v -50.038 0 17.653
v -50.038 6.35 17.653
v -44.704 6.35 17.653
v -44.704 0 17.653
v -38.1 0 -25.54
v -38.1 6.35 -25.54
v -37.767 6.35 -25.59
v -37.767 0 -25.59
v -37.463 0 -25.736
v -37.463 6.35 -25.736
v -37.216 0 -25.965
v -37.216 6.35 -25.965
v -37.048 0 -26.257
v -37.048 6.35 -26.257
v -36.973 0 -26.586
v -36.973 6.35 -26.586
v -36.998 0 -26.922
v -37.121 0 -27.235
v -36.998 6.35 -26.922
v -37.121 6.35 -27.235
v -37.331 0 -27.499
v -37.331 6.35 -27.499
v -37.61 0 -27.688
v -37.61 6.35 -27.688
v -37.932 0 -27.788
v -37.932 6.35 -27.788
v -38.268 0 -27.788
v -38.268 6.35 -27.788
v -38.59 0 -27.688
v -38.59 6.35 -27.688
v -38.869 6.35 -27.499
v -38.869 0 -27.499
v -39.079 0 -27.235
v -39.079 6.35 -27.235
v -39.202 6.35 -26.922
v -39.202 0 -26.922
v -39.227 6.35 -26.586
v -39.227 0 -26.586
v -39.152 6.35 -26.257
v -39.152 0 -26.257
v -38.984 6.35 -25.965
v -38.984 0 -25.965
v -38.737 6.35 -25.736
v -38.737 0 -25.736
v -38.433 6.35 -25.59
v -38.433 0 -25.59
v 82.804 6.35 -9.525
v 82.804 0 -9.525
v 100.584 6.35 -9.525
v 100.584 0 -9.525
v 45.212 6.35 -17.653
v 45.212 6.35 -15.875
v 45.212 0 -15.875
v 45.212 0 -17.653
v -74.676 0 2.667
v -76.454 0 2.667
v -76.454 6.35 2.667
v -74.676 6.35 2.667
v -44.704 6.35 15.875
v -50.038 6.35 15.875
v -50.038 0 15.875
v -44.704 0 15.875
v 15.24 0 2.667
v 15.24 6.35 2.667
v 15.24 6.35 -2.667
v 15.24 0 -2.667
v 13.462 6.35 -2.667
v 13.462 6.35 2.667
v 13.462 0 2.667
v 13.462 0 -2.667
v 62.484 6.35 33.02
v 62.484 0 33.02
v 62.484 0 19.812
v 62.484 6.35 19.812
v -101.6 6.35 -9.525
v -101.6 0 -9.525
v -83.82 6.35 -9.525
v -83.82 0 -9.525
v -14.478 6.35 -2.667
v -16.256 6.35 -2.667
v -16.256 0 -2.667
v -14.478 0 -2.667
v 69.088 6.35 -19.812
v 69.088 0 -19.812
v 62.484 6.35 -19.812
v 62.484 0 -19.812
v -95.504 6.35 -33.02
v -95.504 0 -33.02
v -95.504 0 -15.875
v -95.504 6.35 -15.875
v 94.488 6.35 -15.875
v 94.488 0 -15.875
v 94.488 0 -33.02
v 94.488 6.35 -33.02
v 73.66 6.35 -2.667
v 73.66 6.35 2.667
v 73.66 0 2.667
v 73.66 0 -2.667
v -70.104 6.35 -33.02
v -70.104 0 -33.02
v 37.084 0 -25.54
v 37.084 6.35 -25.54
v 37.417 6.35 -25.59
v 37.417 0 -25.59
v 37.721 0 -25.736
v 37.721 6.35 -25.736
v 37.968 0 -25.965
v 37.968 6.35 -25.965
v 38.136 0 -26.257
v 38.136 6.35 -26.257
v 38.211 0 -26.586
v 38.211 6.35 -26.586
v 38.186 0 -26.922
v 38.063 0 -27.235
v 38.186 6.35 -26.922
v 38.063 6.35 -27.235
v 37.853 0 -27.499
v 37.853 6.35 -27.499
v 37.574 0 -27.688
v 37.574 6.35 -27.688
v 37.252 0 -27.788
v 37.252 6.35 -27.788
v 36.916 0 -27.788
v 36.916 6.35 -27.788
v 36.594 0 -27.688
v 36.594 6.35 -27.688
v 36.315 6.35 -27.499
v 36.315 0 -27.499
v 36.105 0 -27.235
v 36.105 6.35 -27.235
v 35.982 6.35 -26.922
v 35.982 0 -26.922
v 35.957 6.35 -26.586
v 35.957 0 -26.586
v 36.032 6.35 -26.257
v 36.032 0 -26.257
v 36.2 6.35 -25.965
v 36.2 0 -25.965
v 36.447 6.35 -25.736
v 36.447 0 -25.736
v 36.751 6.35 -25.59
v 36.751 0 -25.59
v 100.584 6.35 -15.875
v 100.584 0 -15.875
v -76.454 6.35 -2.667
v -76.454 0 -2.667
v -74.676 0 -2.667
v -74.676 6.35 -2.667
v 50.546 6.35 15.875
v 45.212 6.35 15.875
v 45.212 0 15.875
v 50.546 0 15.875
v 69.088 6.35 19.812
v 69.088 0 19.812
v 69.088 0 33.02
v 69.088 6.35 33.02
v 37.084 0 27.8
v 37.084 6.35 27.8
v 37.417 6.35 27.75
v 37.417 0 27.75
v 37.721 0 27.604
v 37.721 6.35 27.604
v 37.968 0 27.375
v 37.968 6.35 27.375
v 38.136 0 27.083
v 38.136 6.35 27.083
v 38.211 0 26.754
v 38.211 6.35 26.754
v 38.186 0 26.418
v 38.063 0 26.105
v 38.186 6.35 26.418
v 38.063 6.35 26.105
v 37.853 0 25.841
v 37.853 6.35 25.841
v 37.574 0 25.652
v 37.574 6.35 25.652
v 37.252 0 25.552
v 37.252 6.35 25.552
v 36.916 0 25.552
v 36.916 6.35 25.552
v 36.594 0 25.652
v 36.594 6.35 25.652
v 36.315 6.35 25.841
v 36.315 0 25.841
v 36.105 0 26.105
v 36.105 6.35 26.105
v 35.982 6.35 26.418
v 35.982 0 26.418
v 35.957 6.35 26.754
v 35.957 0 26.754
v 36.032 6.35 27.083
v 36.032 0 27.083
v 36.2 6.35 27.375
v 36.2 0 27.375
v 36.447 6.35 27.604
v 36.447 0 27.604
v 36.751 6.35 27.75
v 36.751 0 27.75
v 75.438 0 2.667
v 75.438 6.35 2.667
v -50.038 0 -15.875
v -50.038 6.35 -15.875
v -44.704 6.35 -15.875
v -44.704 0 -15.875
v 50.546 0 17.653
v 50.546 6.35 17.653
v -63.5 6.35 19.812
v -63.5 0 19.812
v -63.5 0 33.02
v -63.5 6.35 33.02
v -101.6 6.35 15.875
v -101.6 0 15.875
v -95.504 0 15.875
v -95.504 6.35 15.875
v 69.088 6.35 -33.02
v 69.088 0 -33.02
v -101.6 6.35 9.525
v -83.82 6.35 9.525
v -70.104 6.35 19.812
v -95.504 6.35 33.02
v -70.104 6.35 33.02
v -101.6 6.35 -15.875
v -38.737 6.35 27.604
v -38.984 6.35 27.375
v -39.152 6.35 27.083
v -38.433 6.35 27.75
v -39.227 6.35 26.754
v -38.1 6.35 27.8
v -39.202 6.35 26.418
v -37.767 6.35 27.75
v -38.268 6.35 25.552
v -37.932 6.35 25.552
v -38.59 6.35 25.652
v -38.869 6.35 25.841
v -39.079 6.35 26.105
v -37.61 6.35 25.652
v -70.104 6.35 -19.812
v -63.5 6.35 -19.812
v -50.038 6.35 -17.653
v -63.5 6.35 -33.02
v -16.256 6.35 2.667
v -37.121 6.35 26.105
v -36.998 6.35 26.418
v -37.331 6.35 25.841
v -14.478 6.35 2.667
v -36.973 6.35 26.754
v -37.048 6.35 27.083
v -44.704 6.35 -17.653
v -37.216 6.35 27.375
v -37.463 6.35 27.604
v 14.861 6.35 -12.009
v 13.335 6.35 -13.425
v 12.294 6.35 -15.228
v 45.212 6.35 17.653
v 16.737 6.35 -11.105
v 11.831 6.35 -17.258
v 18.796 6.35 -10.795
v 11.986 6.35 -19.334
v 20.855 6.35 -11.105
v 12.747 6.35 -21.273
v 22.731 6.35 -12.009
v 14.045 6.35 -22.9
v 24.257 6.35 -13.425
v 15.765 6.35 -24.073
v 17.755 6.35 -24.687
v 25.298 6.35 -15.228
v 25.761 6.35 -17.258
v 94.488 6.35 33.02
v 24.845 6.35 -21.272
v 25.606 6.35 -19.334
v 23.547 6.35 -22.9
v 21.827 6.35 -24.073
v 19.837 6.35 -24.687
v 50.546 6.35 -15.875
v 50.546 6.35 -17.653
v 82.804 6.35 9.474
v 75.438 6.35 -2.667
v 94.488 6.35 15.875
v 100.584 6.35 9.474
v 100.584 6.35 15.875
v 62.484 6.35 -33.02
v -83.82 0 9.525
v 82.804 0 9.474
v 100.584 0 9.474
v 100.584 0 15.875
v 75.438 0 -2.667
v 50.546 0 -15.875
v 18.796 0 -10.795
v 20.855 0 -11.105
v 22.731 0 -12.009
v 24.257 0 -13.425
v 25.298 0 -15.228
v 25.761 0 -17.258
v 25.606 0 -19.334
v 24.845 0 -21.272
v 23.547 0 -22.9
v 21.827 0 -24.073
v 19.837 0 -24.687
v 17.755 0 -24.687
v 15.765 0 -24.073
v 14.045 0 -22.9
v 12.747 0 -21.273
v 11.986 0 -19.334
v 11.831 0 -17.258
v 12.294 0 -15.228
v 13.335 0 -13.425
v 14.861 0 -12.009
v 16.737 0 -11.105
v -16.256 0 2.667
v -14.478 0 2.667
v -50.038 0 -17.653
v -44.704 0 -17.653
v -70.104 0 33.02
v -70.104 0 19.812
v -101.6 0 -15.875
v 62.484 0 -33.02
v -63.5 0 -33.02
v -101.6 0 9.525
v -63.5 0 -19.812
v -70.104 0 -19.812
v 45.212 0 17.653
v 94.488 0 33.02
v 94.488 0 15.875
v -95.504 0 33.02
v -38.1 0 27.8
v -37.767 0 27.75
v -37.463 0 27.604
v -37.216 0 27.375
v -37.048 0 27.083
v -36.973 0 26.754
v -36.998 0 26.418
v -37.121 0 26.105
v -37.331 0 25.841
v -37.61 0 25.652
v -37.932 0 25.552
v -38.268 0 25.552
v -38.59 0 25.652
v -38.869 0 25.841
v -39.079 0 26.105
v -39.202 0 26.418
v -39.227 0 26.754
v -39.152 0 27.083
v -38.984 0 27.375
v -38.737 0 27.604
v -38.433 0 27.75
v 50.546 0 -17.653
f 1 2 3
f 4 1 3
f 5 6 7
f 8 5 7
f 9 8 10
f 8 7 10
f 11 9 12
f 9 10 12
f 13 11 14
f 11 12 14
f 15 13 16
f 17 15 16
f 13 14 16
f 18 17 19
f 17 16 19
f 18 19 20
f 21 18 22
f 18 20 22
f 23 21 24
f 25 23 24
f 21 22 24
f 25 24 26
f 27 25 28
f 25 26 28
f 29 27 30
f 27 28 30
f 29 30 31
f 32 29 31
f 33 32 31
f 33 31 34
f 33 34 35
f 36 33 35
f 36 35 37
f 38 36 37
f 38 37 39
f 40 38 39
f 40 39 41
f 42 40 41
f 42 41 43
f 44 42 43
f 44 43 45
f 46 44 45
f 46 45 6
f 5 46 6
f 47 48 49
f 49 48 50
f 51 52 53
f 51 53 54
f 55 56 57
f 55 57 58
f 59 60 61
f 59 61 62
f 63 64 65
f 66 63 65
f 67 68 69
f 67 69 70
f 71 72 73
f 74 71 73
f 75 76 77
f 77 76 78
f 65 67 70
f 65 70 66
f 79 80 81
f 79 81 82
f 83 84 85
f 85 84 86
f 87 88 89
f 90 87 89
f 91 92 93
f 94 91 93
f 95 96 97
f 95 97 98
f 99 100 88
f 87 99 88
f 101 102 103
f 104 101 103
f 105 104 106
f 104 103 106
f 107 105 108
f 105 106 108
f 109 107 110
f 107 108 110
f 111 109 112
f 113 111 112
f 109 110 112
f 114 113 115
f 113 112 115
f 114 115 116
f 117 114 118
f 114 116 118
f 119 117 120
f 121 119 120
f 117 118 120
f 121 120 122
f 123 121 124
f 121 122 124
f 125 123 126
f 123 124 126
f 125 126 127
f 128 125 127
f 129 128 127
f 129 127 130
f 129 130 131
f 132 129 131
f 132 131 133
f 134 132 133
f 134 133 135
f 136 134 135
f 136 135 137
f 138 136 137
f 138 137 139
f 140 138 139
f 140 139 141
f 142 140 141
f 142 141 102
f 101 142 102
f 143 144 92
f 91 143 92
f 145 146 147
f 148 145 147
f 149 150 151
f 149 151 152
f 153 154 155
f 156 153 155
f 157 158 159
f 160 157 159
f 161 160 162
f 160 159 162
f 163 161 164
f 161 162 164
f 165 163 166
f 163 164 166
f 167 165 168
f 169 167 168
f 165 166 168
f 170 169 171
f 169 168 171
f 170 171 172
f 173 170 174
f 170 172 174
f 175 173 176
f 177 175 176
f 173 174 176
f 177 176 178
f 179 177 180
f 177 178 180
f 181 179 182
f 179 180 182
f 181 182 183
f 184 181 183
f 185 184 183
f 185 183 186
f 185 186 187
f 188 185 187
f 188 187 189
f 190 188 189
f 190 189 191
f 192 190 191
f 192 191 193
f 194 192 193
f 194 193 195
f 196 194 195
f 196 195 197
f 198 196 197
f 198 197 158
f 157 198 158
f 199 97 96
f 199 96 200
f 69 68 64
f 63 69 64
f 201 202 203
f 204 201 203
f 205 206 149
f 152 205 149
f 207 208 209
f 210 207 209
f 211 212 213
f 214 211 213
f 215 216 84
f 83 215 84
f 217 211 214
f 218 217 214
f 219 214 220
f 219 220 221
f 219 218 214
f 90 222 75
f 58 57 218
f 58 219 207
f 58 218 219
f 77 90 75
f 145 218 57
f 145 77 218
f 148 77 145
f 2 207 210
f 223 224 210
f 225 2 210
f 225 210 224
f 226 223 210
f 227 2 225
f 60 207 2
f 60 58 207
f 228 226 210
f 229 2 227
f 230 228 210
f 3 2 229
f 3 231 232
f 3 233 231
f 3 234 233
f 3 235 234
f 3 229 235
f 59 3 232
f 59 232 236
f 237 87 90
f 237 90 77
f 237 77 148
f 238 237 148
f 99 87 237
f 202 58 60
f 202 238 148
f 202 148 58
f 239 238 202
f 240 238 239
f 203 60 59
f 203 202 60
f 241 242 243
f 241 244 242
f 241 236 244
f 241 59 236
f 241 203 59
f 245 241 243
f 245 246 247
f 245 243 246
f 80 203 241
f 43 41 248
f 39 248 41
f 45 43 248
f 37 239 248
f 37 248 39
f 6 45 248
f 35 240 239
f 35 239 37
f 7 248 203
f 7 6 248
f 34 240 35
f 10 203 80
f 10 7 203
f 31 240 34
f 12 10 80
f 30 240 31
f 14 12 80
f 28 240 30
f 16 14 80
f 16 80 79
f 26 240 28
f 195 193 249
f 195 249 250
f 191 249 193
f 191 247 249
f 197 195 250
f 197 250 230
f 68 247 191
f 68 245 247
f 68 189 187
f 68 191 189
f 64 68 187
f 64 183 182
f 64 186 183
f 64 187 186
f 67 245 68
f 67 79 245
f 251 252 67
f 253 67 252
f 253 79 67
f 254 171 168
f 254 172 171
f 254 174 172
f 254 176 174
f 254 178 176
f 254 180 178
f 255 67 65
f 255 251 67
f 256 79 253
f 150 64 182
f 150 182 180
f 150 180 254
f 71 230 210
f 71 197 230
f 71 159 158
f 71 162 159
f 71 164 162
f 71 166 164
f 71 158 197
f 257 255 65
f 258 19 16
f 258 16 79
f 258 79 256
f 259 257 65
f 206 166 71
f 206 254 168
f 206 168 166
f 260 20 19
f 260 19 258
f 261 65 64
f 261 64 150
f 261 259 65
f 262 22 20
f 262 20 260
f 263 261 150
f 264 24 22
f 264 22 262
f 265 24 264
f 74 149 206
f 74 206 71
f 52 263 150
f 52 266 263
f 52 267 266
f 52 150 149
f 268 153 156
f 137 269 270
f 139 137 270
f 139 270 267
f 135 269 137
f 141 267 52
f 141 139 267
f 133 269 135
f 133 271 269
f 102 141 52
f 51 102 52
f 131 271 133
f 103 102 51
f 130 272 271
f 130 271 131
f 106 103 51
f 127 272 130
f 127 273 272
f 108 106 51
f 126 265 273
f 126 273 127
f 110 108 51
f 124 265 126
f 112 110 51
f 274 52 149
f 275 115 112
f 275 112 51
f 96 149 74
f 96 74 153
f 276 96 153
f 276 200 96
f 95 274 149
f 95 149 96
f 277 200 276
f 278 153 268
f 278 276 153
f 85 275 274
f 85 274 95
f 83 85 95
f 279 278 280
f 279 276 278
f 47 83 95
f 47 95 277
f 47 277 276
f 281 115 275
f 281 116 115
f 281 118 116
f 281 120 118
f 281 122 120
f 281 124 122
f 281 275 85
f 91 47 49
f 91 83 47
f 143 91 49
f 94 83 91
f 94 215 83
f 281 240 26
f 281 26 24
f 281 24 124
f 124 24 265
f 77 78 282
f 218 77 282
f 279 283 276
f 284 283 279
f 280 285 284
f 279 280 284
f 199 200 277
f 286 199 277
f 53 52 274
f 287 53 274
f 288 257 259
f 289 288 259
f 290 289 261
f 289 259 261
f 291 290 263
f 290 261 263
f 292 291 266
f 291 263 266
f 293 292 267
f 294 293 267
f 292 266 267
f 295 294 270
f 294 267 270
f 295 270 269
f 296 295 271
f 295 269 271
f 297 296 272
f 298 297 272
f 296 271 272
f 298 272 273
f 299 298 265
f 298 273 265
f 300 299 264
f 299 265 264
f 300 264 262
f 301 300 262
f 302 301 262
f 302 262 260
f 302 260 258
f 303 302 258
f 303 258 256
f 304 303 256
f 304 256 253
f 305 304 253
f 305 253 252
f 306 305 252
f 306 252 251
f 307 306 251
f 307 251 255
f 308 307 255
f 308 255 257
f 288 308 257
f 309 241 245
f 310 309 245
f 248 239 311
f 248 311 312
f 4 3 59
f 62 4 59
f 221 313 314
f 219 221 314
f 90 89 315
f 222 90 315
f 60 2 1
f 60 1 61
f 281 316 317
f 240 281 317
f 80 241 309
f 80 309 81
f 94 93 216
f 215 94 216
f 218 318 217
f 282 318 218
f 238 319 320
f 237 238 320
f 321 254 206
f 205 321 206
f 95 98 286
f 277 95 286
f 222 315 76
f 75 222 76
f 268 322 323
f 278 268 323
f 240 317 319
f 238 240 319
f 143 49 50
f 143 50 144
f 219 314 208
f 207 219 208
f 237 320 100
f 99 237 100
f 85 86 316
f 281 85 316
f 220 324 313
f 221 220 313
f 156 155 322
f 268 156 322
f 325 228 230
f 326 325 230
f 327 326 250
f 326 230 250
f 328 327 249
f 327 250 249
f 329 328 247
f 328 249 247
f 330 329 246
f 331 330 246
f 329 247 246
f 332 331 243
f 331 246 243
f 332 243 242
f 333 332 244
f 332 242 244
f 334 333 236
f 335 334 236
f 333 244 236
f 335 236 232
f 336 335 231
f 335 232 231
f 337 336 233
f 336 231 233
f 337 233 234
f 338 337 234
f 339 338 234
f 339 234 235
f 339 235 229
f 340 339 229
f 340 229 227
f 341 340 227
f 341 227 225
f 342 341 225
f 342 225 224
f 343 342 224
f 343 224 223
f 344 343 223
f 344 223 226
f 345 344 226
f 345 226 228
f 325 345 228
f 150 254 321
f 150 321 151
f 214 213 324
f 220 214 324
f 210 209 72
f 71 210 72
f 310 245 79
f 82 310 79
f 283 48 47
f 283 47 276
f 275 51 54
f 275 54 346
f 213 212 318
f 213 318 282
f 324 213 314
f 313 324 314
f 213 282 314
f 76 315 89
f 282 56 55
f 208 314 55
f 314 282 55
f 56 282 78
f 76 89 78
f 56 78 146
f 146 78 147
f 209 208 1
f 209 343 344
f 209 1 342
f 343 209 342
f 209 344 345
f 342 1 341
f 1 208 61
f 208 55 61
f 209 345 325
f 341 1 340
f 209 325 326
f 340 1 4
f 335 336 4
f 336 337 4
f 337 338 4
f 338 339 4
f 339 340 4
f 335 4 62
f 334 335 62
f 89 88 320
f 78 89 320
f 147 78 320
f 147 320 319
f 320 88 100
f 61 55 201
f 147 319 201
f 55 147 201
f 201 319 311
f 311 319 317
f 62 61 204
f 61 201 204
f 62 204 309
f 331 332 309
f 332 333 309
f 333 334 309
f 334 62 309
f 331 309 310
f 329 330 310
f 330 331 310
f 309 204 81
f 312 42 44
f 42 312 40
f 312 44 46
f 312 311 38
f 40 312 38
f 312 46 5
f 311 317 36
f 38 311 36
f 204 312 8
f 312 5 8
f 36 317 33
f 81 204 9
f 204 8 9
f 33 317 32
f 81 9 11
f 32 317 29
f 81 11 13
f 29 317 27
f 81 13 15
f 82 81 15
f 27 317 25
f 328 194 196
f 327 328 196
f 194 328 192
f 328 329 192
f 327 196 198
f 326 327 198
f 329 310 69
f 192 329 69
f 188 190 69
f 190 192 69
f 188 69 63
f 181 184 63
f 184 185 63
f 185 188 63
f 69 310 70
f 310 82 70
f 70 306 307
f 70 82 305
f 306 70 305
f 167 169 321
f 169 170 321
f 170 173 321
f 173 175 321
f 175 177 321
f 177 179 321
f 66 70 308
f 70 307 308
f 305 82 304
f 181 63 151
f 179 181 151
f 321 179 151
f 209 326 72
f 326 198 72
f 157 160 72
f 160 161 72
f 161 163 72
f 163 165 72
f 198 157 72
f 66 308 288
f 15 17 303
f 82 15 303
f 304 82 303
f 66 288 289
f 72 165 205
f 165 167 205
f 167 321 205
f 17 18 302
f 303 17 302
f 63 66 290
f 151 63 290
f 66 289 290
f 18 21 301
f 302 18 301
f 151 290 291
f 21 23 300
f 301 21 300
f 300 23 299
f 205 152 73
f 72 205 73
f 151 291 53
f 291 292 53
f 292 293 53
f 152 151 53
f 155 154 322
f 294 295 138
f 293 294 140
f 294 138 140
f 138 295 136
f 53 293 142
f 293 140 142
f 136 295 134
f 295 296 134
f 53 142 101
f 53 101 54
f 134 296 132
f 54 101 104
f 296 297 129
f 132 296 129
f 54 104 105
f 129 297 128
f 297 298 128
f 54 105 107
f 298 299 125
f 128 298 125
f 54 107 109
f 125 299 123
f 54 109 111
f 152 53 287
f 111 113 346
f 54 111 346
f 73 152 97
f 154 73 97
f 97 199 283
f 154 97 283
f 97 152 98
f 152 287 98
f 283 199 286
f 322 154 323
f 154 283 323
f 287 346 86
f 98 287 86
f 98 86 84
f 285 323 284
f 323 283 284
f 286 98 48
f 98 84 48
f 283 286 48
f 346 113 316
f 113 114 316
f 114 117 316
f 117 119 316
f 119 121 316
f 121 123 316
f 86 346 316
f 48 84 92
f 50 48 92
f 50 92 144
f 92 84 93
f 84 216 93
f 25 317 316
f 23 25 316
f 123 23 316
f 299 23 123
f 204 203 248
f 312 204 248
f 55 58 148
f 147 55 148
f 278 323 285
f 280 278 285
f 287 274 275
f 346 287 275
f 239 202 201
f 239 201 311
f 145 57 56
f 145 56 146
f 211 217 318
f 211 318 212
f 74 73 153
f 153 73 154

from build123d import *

# Parameters (mm, degrees)
BOSS_EXTRUDE1_DEPTH = 6.35
SKETCH2_R           = 6.985
SKETCH2_W           = 5.334
SKETCH2_H           = 1.778
CUT_EXTRUDE1_DEPTH  = 10.16
SKETCH3_W           = 1.778
SKETCH3_H           = 5.334
CUT_EXTRUDE2_DEPTH  = 10.16
SKETCH4_R           = 1.1303
CUT_EXTRUDE3_DEPTH  = 10.16
SKETCH5_W           = 17.78
SKETCH5_H           = 19.05
SKETCH5_H_2         = 18.9992
CUT_EXTRUDE4_DEPTH  = 10.16


with BuildPart() as part:
    # Sketch1 → Boss-Extrude1 (new body)
    with BuildSketch(Plane(origin=(0, 0, 0), x_dir=(1, 0, 0), z_dir=(0, 1, 0))):
        Polygon((-95.504, 15.875), (-101.6, 15.875), (-101.6, -15.875), (-95.504, -15.875), (-95.504, -33.02), (-70.104, -33.02), (-70.104, -19.812), (-63.5, -19.812), (-63.5, -33.02), (2.794, -33.02), (9.398, -33.02), (62.484, -33.02), (62.484, -19.812), (69.088, -19.812), (69.088, -33.02), (94.488, -33.02), (94.488, -15.875), (100.584, -15.875), (100.584, 15.875), (94.488, 15.875), (94.488, 33.02), (69.088, 33.02), (69.088, 19.812), (62.484, 19.812), (62.484, 33.02), (9.398, 33.02), (2.794, 33.02), (-63.5, 33.02), (-63.5, 19.812), (-70.104, 19.812), (-70.104, 33.02), (-95.504, 33.02), align=None)
    extrude(amount=BOSS_EXTRUDE1_DEPTH)

    # Sketch2 → Cut-Extrude1 (cut)
    with BuildSketch(Plane(origin=(0, 6.35, 0), x_dir=(1, 0, 0), z_dir=(0, 1, 0))):
        with Locations(Location((18.796, 17.78, 0), (0, 0, 270))):
            Circle(SKETCH2_R)
        with Locations((-47.371, 16.764)):
            Rectangle(SKETCH2_W, SKETCH2_H)
        with Locations((-47.371, -16.764)):
            Rectangle(SKETCH2_W, SKETCH2_H)
        with Locations((47.879, 16.764)):
            Rectangle(SKETCH2_W, SKETCH2_H)
        with Locations((47.879, -16.764)):
            Rectangle(SKETCH2_W, SKETCH2_H)
    extrude(amount=-CUT_EXTRUDE1_DEPTH, mode=Mode.SUBTRACT)

    # Sketch3 → Cut-Extrude2 (cut)
    with BuildSketch(Plane(origin=(0, 6.35, 0), x_dir=(1, 0, 0), z_dir=(0, 1, 0))):
        with Locations((-75.565, 0)):
            Rectangle(SKETCH3_W, SKETCH3_H)
        with Locations((-15.367, 0)):
            Rectangle(SKETCH3_W, SKETCH3_H)
        with Locations((14.351, 0)):
            Rectangle(SKETCH3_W, SKETCH3_H)
        with Locations((74.549, 0)):
            Rectangle(SKETCH3_W, SKETCH3_H)
    extrude(amount=-CUT_EXTRUDE2_DEPTH, mode=Mode.SUBTRACT)

    # Sketch4 → Cut-Extrude3 (cut)
    with BuildSketch(Plane(origin=(0, 6.35, 0), x_dir=(1, 0, 0), z_dir=(0, 1, 0))):
        with Locations(Location((-38.1, 26.67, 0), (0, 0, 270))):
            Circle(SKETCH4_R)
        with Locations(Location((37.084, 26.67, 0), (0, 0, 270))):
            Circle(SKETCH4_R)
        with Locations(Location((-38.1, -26.67, 0), (0, 0, 270))):
            Circle(SKETCH4_R)
        with Locations(Location((37.084, -26.67, 0), (0, 0, 270))):
            Circle(SKETCH4_R)
    extrude(amount=-CUT_EXTRUDE3_DEPTH, mode=Mode.SUBTRACT)

    # Sketch5 → Cut-Extrude4 (cut)
    with BuildSketch(Plane.XZ):
        with Locations((-92.71, 0)):
            Rectangle(SKETCH5_W, SKETCH5_H)
        with Locations((91.694, -0.0254)):
            Rectangle(SKETCH5_W, SKETCH5_H_2)
    extrude(amount=-CUT_EXTRUDE4_DEPTH, mode=Mode.SUBTRACT)


solid = part.part
